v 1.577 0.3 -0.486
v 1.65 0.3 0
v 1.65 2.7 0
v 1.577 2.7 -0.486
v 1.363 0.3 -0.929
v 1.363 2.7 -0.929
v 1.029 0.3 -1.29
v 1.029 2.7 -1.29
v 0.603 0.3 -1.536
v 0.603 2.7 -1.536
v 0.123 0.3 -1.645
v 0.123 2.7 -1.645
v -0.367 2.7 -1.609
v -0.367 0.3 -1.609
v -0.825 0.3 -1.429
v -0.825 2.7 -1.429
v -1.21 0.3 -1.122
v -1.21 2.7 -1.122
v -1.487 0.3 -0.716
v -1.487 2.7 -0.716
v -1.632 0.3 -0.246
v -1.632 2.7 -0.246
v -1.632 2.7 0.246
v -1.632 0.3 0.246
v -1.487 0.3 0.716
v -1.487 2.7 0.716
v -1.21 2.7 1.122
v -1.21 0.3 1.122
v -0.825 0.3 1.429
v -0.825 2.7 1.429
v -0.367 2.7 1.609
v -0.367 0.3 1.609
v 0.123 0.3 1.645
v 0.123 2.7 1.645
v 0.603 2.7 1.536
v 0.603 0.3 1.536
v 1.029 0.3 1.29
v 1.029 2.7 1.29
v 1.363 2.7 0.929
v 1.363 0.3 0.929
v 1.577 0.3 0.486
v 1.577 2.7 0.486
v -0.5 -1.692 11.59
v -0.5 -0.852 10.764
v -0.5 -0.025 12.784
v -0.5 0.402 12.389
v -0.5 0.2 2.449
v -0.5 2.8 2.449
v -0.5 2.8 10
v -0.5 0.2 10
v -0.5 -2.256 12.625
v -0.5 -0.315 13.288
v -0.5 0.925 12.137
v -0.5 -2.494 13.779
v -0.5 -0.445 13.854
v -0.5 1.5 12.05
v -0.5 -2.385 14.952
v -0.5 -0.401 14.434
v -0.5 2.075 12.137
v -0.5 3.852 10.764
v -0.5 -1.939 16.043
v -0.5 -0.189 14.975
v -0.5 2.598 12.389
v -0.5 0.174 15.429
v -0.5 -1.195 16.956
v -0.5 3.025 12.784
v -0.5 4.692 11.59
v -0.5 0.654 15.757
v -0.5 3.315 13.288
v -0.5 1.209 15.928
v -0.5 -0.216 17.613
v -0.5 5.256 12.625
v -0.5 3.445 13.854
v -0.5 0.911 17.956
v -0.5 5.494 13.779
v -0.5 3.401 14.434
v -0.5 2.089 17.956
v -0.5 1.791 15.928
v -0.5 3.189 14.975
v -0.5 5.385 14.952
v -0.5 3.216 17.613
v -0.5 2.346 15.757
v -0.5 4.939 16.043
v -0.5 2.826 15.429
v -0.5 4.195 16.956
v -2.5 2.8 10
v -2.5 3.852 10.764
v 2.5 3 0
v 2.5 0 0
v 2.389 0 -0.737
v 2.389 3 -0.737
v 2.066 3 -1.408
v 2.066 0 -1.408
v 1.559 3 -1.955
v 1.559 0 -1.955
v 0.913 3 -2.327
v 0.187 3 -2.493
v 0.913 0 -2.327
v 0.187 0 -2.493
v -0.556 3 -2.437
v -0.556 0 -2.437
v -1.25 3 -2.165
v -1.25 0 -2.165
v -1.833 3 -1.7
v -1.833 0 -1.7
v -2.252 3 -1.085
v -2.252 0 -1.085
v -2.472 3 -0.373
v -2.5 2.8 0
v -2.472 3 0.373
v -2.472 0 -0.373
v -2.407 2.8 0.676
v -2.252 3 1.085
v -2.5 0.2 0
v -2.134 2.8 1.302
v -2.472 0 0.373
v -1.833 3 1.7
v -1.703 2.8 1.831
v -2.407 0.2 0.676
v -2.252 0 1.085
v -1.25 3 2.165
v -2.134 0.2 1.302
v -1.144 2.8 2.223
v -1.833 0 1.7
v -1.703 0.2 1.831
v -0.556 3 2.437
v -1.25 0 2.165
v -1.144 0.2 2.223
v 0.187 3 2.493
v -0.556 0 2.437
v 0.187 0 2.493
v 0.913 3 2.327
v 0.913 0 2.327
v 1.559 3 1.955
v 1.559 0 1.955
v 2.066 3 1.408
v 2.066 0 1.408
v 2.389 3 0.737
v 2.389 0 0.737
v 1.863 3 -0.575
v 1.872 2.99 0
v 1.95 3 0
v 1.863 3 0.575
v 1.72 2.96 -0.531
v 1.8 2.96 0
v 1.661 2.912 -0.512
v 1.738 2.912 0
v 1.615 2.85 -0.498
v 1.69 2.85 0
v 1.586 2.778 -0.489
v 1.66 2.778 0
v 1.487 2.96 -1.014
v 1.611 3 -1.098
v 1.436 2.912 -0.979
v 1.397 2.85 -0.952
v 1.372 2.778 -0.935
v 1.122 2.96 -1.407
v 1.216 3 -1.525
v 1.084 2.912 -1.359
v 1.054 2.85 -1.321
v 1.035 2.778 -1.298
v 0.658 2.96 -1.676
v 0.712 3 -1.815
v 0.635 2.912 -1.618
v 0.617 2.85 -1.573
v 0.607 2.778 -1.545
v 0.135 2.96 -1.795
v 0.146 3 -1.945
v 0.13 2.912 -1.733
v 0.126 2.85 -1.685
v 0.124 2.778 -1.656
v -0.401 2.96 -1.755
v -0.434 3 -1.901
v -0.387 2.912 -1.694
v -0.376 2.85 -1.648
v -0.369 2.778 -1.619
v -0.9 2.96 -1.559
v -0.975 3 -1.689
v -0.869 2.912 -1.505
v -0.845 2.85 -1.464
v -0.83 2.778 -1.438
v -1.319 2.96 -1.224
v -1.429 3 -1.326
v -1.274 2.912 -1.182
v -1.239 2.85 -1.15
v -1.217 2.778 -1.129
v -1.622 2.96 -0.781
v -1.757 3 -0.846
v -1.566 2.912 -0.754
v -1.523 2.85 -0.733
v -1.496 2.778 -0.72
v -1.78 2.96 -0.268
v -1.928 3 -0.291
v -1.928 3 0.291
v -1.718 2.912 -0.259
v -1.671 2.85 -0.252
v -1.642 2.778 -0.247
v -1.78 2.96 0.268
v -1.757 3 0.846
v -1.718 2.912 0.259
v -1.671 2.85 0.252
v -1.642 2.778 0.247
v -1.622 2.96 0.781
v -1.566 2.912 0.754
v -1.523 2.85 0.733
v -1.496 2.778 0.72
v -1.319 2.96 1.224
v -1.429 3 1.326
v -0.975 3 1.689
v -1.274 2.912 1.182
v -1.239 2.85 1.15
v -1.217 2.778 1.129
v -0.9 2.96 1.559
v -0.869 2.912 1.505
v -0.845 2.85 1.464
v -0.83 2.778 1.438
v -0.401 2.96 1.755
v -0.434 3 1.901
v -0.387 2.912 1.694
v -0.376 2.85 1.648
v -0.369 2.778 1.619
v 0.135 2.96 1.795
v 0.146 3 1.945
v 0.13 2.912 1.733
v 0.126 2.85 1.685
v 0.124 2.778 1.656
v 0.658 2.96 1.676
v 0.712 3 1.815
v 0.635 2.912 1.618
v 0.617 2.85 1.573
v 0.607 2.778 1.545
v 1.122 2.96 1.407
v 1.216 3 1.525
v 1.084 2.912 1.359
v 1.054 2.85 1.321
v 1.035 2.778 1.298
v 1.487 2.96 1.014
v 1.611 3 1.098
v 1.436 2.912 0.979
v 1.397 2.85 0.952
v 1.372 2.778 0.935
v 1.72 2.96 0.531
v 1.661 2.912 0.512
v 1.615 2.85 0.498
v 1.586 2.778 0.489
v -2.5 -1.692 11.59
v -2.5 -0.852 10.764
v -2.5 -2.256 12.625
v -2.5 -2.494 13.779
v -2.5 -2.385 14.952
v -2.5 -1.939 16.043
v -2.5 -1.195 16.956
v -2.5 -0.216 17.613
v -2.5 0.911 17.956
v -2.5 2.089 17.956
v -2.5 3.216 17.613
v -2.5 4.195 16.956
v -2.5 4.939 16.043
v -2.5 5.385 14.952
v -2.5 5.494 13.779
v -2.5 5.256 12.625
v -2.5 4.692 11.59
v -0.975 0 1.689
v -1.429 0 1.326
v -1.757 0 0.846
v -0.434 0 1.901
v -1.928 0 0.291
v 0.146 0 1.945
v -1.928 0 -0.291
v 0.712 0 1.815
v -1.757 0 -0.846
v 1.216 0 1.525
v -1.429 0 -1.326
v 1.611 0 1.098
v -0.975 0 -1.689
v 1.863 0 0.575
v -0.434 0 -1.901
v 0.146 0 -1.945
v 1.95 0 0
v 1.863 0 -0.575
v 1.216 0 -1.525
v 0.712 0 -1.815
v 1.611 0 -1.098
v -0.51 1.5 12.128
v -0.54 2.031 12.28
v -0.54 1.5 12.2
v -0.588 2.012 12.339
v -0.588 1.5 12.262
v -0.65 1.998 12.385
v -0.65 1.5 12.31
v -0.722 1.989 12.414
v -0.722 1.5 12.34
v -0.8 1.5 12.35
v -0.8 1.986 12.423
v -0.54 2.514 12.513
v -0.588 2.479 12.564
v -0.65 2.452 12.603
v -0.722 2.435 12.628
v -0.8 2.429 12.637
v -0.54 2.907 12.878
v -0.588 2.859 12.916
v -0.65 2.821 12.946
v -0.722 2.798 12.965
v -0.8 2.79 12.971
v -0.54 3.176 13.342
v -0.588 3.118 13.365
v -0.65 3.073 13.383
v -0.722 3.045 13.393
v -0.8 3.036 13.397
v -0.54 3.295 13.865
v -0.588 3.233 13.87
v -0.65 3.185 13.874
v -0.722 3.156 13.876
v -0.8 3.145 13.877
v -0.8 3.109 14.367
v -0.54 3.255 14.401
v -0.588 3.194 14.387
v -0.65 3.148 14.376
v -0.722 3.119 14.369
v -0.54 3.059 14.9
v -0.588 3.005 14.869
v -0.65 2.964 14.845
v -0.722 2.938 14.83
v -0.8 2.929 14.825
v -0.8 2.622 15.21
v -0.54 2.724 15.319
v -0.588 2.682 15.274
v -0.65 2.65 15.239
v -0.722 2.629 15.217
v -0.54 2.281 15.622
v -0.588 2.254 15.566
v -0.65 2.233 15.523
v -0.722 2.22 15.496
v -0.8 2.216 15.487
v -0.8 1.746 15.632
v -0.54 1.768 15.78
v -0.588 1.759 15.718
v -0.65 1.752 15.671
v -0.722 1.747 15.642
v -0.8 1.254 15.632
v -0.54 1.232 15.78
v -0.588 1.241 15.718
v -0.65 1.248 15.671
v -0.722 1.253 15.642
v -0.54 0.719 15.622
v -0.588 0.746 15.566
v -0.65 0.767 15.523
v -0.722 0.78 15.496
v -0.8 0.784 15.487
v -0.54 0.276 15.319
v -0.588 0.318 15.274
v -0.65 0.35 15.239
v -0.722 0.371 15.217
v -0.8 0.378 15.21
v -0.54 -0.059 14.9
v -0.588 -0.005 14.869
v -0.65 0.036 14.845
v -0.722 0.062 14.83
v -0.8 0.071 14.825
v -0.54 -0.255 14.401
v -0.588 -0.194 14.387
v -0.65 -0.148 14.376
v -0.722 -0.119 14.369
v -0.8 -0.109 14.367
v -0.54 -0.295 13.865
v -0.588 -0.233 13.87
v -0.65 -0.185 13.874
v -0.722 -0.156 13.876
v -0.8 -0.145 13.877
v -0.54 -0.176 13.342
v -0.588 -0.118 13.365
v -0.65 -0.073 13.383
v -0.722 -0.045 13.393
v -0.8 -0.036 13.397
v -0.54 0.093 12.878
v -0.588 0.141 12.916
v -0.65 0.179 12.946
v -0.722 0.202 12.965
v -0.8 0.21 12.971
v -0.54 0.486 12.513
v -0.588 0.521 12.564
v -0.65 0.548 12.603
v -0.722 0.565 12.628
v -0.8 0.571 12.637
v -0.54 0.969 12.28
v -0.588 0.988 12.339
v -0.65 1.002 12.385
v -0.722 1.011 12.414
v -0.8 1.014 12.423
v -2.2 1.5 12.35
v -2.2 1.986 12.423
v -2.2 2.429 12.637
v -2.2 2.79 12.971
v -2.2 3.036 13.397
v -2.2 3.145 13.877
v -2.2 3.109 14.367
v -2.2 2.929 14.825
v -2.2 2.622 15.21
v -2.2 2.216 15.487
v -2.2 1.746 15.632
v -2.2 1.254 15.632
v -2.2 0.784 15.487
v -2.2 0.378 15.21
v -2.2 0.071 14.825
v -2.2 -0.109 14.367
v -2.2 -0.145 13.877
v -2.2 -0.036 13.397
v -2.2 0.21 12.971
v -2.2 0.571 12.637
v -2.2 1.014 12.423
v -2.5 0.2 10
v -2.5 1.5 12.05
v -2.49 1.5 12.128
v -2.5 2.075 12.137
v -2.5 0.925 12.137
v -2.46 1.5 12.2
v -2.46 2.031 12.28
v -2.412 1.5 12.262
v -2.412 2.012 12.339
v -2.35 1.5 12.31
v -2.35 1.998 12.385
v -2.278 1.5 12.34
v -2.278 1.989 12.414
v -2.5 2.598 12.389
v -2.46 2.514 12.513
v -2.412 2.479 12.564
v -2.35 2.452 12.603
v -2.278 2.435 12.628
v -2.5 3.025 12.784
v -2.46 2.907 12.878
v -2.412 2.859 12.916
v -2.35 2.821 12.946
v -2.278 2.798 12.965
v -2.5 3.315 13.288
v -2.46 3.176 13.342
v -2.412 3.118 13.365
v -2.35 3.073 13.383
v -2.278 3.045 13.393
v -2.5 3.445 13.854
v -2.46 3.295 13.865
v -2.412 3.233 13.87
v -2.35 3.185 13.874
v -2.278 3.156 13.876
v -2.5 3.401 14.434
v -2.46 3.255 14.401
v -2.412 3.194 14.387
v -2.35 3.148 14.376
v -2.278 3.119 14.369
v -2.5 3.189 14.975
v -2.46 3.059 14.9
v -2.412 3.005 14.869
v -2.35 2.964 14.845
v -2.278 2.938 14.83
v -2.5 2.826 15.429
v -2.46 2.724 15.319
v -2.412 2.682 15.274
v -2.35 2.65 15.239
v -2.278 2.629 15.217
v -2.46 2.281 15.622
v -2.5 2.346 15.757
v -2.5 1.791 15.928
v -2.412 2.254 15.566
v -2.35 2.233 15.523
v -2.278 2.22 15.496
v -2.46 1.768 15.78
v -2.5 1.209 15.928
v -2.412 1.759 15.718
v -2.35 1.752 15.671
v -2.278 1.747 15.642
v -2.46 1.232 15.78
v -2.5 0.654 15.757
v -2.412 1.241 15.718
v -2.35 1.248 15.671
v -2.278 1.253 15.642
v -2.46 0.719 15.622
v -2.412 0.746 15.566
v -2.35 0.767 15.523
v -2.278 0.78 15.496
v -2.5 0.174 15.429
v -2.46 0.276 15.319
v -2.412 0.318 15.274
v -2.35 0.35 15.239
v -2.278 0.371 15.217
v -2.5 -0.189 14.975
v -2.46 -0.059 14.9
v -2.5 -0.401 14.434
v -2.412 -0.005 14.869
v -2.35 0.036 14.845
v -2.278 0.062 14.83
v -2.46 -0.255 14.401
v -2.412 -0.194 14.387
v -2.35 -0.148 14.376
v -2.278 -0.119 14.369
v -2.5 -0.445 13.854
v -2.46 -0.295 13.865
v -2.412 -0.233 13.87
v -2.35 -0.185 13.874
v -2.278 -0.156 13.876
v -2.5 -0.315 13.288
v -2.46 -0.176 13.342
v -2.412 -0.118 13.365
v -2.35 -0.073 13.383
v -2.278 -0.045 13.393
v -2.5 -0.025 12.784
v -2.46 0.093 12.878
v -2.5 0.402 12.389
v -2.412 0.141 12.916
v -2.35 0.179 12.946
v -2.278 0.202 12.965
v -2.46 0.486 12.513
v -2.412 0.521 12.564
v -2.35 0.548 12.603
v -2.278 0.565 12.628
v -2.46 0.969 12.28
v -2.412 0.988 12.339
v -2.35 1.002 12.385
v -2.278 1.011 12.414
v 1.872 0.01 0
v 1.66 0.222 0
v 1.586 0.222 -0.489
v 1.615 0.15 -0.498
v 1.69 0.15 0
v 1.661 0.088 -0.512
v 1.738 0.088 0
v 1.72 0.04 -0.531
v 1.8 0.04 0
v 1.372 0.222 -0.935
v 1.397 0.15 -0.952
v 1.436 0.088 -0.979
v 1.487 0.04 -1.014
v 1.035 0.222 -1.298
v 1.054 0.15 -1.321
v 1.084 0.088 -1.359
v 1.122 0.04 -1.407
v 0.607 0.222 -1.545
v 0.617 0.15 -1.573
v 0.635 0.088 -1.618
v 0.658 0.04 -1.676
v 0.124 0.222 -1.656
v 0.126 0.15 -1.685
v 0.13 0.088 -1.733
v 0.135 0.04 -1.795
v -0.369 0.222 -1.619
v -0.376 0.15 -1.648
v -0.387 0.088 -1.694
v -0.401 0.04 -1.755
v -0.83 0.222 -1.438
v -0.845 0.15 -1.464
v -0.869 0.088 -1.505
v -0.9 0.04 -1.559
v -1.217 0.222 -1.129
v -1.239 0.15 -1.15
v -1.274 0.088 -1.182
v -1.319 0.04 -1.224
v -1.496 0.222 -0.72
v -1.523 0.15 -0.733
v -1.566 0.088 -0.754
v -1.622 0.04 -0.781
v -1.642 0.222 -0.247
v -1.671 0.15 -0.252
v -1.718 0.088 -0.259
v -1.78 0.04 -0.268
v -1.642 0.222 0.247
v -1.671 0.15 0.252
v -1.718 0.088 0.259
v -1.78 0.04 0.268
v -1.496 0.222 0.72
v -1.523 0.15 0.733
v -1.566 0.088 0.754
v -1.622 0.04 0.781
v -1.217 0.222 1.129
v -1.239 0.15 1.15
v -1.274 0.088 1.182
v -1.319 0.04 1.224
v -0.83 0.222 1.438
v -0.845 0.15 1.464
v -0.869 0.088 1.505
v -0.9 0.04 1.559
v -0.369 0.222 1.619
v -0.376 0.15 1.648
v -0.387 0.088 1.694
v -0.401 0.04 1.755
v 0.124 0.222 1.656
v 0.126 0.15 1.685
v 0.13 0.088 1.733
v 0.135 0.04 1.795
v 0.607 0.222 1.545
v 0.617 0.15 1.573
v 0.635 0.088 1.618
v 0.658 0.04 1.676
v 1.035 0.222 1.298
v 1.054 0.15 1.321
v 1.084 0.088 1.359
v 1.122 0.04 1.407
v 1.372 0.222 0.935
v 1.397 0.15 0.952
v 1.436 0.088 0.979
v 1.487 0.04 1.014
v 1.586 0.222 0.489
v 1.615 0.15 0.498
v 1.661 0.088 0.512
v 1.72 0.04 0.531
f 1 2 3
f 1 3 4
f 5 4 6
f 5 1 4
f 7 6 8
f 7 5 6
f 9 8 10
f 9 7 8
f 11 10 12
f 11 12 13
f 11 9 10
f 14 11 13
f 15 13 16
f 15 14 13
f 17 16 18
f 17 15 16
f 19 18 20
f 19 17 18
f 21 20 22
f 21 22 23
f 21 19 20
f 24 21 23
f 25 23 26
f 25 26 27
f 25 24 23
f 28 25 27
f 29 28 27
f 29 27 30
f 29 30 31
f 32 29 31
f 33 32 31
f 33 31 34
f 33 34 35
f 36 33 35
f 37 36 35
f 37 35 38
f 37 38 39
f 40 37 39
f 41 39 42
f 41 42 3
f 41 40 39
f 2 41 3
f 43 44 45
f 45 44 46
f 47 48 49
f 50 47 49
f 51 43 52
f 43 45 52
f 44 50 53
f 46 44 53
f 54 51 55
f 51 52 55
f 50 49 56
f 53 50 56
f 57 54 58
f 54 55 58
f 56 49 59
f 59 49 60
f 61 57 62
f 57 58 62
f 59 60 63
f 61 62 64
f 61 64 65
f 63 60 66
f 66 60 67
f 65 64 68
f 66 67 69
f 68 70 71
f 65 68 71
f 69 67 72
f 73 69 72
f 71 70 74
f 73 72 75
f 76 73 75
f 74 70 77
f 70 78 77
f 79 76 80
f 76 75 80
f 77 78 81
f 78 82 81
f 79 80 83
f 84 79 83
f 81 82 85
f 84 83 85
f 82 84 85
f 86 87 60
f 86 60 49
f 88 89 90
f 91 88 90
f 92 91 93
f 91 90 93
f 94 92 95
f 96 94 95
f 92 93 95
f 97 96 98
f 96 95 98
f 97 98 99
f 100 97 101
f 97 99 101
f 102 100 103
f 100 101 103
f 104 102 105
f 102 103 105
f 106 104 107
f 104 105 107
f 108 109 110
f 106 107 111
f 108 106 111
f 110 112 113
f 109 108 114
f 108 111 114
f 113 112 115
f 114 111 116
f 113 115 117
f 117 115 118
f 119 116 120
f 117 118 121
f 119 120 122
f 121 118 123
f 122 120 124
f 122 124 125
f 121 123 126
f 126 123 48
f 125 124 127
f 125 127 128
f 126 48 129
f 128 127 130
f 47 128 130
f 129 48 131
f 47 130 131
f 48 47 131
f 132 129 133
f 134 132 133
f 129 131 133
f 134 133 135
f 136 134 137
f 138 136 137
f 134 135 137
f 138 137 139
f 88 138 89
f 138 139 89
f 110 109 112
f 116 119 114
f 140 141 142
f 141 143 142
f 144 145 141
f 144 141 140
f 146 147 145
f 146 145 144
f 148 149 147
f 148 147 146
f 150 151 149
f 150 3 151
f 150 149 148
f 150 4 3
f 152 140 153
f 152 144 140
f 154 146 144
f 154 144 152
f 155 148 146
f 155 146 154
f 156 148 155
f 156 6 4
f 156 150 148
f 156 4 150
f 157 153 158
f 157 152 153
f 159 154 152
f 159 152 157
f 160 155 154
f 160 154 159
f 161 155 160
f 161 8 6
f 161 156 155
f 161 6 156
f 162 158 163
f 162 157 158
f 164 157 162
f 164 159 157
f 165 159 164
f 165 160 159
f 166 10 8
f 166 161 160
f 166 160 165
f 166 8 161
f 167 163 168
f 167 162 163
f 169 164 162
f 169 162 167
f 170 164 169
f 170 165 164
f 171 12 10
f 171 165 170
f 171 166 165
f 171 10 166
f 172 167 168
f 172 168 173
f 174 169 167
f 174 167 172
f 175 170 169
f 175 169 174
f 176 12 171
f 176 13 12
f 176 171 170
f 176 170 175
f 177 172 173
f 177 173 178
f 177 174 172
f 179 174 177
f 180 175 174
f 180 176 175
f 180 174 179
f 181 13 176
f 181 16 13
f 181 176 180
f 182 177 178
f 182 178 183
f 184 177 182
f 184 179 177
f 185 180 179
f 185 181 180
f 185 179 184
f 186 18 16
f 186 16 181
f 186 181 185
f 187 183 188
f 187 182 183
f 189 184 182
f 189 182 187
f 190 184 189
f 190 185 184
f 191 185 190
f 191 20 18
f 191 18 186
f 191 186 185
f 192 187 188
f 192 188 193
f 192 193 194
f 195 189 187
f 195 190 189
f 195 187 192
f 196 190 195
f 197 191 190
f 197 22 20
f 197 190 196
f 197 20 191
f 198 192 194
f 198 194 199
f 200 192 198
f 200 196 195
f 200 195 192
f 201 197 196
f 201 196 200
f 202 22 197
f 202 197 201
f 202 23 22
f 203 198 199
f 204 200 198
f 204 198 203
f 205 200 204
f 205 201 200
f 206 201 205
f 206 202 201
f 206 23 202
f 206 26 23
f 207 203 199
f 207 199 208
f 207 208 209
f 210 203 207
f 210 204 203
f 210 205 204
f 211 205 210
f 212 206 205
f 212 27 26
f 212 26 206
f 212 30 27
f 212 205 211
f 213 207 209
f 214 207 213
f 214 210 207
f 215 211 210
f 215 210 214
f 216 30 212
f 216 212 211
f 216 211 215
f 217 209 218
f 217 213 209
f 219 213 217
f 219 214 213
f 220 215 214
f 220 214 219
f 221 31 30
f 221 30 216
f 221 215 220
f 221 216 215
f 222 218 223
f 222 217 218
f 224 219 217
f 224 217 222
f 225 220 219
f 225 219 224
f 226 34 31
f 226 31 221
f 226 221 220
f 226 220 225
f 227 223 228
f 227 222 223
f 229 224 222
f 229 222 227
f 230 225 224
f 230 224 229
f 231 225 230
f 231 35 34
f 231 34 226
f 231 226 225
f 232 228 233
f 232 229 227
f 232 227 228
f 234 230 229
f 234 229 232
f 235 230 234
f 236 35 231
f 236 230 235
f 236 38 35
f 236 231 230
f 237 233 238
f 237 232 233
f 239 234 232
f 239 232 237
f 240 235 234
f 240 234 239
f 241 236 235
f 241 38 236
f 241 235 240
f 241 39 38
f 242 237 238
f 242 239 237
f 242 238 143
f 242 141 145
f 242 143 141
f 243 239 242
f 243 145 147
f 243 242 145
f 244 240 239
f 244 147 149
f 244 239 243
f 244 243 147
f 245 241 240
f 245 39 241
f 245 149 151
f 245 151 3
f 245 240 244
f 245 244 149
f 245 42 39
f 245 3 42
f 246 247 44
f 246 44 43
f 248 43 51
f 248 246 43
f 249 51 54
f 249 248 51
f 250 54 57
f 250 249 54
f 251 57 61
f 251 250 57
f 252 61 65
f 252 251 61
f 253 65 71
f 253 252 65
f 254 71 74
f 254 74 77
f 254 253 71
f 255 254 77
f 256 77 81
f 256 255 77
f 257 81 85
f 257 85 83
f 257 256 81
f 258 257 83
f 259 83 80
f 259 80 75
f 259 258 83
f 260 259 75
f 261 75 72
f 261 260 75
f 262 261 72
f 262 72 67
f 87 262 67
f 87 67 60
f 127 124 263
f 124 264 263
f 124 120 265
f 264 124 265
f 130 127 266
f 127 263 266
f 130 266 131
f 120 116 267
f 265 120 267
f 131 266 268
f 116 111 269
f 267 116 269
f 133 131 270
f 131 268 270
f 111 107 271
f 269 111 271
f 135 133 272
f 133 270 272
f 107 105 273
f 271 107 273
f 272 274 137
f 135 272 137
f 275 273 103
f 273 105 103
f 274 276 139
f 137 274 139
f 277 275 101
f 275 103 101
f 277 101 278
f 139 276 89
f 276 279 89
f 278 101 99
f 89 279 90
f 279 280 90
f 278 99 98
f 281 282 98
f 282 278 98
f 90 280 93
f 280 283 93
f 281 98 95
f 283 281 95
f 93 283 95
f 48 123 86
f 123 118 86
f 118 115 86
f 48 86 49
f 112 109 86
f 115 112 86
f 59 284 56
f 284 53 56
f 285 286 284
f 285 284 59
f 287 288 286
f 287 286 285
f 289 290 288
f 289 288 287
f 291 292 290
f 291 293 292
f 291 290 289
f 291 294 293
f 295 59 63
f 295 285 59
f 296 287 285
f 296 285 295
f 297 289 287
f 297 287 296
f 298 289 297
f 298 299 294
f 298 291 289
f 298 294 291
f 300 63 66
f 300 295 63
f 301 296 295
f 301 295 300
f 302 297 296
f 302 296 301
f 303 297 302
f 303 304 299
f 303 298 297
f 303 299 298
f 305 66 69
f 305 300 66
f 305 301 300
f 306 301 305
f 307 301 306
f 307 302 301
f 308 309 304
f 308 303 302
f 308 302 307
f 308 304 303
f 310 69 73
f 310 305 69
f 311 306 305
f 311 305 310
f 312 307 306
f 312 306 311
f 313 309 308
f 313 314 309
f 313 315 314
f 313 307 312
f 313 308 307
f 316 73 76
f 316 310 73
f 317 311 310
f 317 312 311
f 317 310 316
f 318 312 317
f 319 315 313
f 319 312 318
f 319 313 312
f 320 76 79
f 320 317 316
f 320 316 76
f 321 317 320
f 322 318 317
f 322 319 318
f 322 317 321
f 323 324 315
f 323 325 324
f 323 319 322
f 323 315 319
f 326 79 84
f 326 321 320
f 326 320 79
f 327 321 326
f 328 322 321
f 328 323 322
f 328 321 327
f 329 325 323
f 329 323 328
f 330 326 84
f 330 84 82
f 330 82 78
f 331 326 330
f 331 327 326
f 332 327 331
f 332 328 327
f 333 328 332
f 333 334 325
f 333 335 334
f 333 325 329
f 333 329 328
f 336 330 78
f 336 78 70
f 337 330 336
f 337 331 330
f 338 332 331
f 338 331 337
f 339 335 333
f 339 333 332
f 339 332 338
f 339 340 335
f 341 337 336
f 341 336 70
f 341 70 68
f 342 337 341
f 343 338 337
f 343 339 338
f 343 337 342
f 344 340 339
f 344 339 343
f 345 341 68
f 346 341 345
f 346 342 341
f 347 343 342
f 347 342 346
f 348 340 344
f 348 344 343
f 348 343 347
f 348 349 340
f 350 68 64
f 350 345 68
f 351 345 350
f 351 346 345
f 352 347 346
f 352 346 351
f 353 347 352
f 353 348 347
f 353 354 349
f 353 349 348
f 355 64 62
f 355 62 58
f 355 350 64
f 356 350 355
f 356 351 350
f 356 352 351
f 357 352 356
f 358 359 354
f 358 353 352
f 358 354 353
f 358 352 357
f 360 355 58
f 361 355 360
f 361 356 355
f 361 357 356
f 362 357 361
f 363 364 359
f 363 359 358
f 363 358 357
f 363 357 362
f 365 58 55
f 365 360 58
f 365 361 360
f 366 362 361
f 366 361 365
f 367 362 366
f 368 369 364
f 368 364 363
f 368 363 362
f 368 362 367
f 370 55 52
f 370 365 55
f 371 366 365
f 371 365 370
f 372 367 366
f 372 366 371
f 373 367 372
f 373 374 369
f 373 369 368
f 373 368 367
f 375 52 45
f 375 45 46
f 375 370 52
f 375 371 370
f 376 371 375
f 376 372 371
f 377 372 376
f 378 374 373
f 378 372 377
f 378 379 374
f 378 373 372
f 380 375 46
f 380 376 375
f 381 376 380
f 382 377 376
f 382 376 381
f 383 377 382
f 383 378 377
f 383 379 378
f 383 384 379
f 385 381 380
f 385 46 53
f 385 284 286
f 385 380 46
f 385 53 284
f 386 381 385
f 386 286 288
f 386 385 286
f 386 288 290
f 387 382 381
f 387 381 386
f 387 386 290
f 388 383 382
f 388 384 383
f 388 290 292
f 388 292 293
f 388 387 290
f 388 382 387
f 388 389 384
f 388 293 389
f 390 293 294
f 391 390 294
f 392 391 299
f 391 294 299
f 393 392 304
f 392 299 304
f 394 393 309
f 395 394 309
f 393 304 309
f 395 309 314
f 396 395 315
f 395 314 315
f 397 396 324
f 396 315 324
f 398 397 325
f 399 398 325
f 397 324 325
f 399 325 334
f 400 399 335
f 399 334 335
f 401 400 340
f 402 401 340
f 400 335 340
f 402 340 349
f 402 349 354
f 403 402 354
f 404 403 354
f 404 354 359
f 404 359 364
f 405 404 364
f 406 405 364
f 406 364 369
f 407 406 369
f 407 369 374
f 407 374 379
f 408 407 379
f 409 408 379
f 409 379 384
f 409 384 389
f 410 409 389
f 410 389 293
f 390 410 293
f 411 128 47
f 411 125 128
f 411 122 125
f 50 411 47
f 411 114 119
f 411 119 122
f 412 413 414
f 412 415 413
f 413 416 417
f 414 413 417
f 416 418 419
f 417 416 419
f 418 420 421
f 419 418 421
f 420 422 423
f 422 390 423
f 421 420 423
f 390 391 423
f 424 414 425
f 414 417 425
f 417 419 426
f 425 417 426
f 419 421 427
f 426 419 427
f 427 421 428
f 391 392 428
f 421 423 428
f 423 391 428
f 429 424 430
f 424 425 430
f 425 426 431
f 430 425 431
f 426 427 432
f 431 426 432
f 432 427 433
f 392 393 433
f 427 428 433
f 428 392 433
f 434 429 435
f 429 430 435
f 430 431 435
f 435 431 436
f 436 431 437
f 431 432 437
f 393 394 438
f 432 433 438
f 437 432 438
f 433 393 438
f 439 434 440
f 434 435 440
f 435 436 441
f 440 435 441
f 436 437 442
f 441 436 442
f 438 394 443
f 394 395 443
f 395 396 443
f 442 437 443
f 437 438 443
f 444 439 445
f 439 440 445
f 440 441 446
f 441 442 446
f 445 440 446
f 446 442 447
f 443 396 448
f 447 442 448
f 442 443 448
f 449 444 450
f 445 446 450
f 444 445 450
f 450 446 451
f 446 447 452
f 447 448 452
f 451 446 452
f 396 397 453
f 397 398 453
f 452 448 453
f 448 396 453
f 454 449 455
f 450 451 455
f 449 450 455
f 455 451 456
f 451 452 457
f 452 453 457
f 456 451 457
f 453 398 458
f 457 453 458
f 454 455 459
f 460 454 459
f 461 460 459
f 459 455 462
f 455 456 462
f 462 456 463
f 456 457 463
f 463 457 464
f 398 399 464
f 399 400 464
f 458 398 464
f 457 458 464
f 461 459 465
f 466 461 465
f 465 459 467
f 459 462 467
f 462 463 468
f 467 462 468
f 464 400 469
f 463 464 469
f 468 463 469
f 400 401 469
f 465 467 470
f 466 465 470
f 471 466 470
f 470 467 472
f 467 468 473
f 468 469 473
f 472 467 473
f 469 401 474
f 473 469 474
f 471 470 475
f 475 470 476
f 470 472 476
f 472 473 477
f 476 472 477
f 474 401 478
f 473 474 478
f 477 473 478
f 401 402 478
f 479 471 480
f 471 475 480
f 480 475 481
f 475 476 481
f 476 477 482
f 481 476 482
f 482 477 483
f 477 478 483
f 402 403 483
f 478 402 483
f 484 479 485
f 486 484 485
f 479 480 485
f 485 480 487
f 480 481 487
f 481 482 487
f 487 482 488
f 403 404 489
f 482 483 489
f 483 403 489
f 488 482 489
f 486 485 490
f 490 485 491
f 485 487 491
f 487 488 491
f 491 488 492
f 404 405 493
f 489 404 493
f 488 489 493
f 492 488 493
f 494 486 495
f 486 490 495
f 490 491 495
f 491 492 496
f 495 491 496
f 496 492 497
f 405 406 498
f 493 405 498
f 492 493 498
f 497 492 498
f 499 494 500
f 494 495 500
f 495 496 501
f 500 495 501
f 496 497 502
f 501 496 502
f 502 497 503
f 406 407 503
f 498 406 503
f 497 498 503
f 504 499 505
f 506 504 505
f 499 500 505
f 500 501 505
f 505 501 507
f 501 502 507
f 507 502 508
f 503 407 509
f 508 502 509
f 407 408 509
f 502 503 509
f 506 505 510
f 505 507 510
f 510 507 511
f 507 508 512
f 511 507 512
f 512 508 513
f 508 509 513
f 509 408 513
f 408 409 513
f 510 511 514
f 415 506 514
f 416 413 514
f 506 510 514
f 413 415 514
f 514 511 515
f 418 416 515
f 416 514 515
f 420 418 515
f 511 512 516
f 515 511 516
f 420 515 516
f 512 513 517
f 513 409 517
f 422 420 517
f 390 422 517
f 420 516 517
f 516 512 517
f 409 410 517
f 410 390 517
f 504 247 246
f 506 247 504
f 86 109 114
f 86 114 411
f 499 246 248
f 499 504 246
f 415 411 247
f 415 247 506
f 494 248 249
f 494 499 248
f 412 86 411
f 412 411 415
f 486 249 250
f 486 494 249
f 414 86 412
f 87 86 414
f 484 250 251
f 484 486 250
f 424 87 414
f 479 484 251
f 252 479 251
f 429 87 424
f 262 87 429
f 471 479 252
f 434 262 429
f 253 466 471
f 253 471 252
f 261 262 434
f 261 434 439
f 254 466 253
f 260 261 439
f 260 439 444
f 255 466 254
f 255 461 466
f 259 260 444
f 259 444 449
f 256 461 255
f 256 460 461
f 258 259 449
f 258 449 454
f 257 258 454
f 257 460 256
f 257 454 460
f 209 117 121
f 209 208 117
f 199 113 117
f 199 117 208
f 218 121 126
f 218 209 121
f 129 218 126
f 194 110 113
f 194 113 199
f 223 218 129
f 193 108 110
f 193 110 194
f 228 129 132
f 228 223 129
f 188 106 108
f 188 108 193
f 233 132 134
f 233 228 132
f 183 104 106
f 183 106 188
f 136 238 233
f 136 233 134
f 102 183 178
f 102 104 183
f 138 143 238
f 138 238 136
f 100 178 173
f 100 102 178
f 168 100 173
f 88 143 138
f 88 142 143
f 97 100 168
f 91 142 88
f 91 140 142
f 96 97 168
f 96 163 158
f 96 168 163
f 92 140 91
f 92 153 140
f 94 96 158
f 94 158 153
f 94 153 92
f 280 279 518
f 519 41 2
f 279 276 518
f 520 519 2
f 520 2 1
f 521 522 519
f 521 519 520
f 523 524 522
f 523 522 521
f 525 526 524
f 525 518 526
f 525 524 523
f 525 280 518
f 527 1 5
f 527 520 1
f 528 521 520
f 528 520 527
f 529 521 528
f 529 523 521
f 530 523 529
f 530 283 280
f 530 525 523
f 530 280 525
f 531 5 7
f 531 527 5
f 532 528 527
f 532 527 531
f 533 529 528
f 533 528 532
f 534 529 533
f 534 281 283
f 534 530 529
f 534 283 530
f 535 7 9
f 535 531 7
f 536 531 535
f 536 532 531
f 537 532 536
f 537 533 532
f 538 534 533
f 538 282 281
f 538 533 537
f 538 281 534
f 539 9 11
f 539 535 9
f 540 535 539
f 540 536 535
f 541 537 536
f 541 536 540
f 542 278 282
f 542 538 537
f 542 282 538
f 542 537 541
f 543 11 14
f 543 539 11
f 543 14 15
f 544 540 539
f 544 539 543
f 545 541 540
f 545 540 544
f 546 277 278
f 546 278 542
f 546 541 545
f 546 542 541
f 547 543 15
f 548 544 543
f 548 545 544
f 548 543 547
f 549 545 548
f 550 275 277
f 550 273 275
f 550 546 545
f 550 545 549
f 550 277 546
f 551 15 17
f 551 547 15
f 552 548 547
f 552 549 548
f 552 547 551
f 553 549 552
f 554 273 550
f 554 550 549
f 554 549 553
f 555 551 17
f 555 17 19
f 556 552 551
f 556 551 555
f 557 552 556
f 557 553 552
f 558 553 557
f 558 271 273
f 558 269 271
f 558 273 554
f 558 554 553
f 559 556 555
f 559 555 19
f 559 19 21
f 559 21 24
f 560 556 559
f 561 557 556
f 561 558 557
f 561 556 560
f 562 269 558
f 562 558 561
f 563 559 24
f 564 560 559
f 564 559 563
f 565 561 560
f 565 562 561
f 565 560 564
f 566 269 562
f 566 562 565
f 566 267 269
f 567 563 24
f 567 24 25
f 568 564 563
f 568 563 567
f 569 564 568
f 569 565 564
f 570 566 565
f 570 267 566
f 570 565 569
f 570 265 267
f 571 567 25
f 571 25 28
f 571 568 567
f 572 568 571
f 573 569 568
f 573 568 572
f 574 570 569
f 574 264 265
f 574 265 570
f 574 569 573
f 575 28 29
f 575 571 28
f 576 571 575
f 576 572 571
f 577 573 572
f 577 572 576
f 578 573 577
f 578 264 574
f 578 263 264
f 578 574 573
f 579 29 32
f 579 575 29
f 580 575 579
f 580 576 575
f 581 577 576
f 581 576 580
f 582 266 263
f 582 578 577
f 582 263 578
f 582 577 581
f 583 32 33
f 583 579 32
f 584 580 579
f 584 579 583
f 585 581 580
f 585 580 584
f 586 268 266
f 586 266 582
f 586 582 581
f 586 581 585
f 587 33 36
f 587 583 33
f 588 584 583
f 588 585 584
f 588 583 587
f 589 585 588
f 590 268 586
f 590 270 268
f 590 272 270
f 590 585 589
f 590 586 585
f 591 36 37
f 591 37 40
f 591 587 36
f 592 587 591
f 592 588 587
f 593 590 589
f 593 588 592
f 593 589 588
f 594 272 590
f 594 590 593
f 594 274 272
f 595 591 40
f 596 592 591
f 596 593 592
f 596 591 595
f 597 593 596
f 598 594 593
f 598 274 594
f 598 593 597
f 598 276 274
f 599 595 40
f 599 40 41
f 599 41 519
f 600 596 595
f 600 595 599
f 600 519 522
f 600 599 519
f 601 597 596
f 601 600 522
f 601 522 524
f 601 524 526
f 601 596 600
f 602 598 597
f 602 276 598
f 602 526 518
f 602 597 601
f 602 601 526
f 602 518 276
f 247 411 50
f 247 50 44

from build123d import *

# Parameters (mm, degrees)
SKETCH_1_R          = 2.5
SKETCH_1_R_2        = 1.65
EXTRUDE_1_DEPTH     = 3
EXTRUDE_2_REACH     = 14.5
SKETCH_2_W          = 2
SKETCH_2_H          = 2.6
EXTRUDE_3_DEPTH     = 2
CUT_EXTRUDE_1_REACH = 4
SKETCH_4_R          = 1.65
FILLET_1_R          = 0.3
FILLET_2_R          = 0.3
FILLET_3_R          = 0.3
FILLET_4_R          = 0.3


with BuildPart() as part:
    # 草图1 → 凸台-拉伸1 (new body)
    with BuildSketch(Plane(origin=(0, 0, 0), x_dir=(1, 0, 0), z_dir=(0, 1, 0))):
        Circle(SKETCH_1_R)
        Circle(SKETCH_1_R_2, mode=Mode.SUBTRACT)
    extrude(amount=EXTRUDE_1_DEPTH)

    # 草图2 → 凸台-拉伸2 (add, up to next)
    with BuildSketch(Plane.XY.offset(10), mode=Mode.PRIVATE) as extrude_2_sk1:
        with Locations((-1.5, 1.5)):
            Rectangle(SKETCH_2_W, SKETCH_2_H)
    extrude_2_tool1 = extrude(extrude_2_sk1.sketch, amount=-EXTRUDE_2_REACH, mode=Mode.PRIVATE) - part.part
    add(extrude_2_tool1.solids().sort_by_distance((-1.5, 1.5, 10))[0])

    # 草图3 → 凸台-拉伸3 (add)
    with BuildSketch(Plane.ZY.offset(2.5)):
        with BuildLine():
            Line((10, 2.8), (10, 0.2))
            Line((10, 0.2), (10.764273601, -0.85161108))
            ThreePointArc((10.764273601, -0.85161108), (18, 1.5), (10.764273601, 3.85161108))
            Line((10.764273601, 3.85161108), (10, 2.8))
        make_face()
    extrude(amount=-EXTRUDE_3_DEPTH)

    # 草图4 → 切除-拉伸1 (cut, up to next)
    with BuildSketch(Plane(origin=(-0.5, 0, 0), x_dir=(0, 0, -1), z_dir=(1, 0, 0)), mode=Mode.PRIVATE) as cut_extrude_1_sk1:
        with Locations((-14, 1.5)):
            Circle(SKETCH_4_R)
    cut_extrude_1_tool1 = extrude(cut_extrude_1_sk1.sketch, amount=-CUT_EXTRUDE_1_REACH, mode=Mode.PRIVATE) & part.part
    add(cut_extrude_1_tool1.solids().sort_by_distance((-0.5, 1.5, 14))[0], mode=Mode.SUBTRACT)

    # 圆角1
    fillet_1_edges = [part.edges().sort_by_distance(p)[0] for p in [
        (-0.5, 1.5, 15.65),
    ]]
    fillet(fillet_1_edges, radius=FILLET_1_R)

    # 圆角2
    fillet_2_edges = [part.edges().sort_by_distance(p)[0] for p in [
        (-1.65, 3, 0),
    ]]
    fillet(fillet_2_edges, radius=FILLET_2_R)

    # 圆角3
    fillet_3_edges = [part.edges().sort_by_distance(p)[0] for p in [
        (-1.65, 0, 0),
    ]]
    fillet(fillet_3_edges, radius=FILLET_3_R)

    # 圆角4
    fillet_4_edges = [part.edges().sort_by_distance(p)[0] for p in [
        (-2.5, 1.5, 15.65),
    ]]
    fillet(fillet_4_edges, radius=FILLET_4_R)


solid = part.part
